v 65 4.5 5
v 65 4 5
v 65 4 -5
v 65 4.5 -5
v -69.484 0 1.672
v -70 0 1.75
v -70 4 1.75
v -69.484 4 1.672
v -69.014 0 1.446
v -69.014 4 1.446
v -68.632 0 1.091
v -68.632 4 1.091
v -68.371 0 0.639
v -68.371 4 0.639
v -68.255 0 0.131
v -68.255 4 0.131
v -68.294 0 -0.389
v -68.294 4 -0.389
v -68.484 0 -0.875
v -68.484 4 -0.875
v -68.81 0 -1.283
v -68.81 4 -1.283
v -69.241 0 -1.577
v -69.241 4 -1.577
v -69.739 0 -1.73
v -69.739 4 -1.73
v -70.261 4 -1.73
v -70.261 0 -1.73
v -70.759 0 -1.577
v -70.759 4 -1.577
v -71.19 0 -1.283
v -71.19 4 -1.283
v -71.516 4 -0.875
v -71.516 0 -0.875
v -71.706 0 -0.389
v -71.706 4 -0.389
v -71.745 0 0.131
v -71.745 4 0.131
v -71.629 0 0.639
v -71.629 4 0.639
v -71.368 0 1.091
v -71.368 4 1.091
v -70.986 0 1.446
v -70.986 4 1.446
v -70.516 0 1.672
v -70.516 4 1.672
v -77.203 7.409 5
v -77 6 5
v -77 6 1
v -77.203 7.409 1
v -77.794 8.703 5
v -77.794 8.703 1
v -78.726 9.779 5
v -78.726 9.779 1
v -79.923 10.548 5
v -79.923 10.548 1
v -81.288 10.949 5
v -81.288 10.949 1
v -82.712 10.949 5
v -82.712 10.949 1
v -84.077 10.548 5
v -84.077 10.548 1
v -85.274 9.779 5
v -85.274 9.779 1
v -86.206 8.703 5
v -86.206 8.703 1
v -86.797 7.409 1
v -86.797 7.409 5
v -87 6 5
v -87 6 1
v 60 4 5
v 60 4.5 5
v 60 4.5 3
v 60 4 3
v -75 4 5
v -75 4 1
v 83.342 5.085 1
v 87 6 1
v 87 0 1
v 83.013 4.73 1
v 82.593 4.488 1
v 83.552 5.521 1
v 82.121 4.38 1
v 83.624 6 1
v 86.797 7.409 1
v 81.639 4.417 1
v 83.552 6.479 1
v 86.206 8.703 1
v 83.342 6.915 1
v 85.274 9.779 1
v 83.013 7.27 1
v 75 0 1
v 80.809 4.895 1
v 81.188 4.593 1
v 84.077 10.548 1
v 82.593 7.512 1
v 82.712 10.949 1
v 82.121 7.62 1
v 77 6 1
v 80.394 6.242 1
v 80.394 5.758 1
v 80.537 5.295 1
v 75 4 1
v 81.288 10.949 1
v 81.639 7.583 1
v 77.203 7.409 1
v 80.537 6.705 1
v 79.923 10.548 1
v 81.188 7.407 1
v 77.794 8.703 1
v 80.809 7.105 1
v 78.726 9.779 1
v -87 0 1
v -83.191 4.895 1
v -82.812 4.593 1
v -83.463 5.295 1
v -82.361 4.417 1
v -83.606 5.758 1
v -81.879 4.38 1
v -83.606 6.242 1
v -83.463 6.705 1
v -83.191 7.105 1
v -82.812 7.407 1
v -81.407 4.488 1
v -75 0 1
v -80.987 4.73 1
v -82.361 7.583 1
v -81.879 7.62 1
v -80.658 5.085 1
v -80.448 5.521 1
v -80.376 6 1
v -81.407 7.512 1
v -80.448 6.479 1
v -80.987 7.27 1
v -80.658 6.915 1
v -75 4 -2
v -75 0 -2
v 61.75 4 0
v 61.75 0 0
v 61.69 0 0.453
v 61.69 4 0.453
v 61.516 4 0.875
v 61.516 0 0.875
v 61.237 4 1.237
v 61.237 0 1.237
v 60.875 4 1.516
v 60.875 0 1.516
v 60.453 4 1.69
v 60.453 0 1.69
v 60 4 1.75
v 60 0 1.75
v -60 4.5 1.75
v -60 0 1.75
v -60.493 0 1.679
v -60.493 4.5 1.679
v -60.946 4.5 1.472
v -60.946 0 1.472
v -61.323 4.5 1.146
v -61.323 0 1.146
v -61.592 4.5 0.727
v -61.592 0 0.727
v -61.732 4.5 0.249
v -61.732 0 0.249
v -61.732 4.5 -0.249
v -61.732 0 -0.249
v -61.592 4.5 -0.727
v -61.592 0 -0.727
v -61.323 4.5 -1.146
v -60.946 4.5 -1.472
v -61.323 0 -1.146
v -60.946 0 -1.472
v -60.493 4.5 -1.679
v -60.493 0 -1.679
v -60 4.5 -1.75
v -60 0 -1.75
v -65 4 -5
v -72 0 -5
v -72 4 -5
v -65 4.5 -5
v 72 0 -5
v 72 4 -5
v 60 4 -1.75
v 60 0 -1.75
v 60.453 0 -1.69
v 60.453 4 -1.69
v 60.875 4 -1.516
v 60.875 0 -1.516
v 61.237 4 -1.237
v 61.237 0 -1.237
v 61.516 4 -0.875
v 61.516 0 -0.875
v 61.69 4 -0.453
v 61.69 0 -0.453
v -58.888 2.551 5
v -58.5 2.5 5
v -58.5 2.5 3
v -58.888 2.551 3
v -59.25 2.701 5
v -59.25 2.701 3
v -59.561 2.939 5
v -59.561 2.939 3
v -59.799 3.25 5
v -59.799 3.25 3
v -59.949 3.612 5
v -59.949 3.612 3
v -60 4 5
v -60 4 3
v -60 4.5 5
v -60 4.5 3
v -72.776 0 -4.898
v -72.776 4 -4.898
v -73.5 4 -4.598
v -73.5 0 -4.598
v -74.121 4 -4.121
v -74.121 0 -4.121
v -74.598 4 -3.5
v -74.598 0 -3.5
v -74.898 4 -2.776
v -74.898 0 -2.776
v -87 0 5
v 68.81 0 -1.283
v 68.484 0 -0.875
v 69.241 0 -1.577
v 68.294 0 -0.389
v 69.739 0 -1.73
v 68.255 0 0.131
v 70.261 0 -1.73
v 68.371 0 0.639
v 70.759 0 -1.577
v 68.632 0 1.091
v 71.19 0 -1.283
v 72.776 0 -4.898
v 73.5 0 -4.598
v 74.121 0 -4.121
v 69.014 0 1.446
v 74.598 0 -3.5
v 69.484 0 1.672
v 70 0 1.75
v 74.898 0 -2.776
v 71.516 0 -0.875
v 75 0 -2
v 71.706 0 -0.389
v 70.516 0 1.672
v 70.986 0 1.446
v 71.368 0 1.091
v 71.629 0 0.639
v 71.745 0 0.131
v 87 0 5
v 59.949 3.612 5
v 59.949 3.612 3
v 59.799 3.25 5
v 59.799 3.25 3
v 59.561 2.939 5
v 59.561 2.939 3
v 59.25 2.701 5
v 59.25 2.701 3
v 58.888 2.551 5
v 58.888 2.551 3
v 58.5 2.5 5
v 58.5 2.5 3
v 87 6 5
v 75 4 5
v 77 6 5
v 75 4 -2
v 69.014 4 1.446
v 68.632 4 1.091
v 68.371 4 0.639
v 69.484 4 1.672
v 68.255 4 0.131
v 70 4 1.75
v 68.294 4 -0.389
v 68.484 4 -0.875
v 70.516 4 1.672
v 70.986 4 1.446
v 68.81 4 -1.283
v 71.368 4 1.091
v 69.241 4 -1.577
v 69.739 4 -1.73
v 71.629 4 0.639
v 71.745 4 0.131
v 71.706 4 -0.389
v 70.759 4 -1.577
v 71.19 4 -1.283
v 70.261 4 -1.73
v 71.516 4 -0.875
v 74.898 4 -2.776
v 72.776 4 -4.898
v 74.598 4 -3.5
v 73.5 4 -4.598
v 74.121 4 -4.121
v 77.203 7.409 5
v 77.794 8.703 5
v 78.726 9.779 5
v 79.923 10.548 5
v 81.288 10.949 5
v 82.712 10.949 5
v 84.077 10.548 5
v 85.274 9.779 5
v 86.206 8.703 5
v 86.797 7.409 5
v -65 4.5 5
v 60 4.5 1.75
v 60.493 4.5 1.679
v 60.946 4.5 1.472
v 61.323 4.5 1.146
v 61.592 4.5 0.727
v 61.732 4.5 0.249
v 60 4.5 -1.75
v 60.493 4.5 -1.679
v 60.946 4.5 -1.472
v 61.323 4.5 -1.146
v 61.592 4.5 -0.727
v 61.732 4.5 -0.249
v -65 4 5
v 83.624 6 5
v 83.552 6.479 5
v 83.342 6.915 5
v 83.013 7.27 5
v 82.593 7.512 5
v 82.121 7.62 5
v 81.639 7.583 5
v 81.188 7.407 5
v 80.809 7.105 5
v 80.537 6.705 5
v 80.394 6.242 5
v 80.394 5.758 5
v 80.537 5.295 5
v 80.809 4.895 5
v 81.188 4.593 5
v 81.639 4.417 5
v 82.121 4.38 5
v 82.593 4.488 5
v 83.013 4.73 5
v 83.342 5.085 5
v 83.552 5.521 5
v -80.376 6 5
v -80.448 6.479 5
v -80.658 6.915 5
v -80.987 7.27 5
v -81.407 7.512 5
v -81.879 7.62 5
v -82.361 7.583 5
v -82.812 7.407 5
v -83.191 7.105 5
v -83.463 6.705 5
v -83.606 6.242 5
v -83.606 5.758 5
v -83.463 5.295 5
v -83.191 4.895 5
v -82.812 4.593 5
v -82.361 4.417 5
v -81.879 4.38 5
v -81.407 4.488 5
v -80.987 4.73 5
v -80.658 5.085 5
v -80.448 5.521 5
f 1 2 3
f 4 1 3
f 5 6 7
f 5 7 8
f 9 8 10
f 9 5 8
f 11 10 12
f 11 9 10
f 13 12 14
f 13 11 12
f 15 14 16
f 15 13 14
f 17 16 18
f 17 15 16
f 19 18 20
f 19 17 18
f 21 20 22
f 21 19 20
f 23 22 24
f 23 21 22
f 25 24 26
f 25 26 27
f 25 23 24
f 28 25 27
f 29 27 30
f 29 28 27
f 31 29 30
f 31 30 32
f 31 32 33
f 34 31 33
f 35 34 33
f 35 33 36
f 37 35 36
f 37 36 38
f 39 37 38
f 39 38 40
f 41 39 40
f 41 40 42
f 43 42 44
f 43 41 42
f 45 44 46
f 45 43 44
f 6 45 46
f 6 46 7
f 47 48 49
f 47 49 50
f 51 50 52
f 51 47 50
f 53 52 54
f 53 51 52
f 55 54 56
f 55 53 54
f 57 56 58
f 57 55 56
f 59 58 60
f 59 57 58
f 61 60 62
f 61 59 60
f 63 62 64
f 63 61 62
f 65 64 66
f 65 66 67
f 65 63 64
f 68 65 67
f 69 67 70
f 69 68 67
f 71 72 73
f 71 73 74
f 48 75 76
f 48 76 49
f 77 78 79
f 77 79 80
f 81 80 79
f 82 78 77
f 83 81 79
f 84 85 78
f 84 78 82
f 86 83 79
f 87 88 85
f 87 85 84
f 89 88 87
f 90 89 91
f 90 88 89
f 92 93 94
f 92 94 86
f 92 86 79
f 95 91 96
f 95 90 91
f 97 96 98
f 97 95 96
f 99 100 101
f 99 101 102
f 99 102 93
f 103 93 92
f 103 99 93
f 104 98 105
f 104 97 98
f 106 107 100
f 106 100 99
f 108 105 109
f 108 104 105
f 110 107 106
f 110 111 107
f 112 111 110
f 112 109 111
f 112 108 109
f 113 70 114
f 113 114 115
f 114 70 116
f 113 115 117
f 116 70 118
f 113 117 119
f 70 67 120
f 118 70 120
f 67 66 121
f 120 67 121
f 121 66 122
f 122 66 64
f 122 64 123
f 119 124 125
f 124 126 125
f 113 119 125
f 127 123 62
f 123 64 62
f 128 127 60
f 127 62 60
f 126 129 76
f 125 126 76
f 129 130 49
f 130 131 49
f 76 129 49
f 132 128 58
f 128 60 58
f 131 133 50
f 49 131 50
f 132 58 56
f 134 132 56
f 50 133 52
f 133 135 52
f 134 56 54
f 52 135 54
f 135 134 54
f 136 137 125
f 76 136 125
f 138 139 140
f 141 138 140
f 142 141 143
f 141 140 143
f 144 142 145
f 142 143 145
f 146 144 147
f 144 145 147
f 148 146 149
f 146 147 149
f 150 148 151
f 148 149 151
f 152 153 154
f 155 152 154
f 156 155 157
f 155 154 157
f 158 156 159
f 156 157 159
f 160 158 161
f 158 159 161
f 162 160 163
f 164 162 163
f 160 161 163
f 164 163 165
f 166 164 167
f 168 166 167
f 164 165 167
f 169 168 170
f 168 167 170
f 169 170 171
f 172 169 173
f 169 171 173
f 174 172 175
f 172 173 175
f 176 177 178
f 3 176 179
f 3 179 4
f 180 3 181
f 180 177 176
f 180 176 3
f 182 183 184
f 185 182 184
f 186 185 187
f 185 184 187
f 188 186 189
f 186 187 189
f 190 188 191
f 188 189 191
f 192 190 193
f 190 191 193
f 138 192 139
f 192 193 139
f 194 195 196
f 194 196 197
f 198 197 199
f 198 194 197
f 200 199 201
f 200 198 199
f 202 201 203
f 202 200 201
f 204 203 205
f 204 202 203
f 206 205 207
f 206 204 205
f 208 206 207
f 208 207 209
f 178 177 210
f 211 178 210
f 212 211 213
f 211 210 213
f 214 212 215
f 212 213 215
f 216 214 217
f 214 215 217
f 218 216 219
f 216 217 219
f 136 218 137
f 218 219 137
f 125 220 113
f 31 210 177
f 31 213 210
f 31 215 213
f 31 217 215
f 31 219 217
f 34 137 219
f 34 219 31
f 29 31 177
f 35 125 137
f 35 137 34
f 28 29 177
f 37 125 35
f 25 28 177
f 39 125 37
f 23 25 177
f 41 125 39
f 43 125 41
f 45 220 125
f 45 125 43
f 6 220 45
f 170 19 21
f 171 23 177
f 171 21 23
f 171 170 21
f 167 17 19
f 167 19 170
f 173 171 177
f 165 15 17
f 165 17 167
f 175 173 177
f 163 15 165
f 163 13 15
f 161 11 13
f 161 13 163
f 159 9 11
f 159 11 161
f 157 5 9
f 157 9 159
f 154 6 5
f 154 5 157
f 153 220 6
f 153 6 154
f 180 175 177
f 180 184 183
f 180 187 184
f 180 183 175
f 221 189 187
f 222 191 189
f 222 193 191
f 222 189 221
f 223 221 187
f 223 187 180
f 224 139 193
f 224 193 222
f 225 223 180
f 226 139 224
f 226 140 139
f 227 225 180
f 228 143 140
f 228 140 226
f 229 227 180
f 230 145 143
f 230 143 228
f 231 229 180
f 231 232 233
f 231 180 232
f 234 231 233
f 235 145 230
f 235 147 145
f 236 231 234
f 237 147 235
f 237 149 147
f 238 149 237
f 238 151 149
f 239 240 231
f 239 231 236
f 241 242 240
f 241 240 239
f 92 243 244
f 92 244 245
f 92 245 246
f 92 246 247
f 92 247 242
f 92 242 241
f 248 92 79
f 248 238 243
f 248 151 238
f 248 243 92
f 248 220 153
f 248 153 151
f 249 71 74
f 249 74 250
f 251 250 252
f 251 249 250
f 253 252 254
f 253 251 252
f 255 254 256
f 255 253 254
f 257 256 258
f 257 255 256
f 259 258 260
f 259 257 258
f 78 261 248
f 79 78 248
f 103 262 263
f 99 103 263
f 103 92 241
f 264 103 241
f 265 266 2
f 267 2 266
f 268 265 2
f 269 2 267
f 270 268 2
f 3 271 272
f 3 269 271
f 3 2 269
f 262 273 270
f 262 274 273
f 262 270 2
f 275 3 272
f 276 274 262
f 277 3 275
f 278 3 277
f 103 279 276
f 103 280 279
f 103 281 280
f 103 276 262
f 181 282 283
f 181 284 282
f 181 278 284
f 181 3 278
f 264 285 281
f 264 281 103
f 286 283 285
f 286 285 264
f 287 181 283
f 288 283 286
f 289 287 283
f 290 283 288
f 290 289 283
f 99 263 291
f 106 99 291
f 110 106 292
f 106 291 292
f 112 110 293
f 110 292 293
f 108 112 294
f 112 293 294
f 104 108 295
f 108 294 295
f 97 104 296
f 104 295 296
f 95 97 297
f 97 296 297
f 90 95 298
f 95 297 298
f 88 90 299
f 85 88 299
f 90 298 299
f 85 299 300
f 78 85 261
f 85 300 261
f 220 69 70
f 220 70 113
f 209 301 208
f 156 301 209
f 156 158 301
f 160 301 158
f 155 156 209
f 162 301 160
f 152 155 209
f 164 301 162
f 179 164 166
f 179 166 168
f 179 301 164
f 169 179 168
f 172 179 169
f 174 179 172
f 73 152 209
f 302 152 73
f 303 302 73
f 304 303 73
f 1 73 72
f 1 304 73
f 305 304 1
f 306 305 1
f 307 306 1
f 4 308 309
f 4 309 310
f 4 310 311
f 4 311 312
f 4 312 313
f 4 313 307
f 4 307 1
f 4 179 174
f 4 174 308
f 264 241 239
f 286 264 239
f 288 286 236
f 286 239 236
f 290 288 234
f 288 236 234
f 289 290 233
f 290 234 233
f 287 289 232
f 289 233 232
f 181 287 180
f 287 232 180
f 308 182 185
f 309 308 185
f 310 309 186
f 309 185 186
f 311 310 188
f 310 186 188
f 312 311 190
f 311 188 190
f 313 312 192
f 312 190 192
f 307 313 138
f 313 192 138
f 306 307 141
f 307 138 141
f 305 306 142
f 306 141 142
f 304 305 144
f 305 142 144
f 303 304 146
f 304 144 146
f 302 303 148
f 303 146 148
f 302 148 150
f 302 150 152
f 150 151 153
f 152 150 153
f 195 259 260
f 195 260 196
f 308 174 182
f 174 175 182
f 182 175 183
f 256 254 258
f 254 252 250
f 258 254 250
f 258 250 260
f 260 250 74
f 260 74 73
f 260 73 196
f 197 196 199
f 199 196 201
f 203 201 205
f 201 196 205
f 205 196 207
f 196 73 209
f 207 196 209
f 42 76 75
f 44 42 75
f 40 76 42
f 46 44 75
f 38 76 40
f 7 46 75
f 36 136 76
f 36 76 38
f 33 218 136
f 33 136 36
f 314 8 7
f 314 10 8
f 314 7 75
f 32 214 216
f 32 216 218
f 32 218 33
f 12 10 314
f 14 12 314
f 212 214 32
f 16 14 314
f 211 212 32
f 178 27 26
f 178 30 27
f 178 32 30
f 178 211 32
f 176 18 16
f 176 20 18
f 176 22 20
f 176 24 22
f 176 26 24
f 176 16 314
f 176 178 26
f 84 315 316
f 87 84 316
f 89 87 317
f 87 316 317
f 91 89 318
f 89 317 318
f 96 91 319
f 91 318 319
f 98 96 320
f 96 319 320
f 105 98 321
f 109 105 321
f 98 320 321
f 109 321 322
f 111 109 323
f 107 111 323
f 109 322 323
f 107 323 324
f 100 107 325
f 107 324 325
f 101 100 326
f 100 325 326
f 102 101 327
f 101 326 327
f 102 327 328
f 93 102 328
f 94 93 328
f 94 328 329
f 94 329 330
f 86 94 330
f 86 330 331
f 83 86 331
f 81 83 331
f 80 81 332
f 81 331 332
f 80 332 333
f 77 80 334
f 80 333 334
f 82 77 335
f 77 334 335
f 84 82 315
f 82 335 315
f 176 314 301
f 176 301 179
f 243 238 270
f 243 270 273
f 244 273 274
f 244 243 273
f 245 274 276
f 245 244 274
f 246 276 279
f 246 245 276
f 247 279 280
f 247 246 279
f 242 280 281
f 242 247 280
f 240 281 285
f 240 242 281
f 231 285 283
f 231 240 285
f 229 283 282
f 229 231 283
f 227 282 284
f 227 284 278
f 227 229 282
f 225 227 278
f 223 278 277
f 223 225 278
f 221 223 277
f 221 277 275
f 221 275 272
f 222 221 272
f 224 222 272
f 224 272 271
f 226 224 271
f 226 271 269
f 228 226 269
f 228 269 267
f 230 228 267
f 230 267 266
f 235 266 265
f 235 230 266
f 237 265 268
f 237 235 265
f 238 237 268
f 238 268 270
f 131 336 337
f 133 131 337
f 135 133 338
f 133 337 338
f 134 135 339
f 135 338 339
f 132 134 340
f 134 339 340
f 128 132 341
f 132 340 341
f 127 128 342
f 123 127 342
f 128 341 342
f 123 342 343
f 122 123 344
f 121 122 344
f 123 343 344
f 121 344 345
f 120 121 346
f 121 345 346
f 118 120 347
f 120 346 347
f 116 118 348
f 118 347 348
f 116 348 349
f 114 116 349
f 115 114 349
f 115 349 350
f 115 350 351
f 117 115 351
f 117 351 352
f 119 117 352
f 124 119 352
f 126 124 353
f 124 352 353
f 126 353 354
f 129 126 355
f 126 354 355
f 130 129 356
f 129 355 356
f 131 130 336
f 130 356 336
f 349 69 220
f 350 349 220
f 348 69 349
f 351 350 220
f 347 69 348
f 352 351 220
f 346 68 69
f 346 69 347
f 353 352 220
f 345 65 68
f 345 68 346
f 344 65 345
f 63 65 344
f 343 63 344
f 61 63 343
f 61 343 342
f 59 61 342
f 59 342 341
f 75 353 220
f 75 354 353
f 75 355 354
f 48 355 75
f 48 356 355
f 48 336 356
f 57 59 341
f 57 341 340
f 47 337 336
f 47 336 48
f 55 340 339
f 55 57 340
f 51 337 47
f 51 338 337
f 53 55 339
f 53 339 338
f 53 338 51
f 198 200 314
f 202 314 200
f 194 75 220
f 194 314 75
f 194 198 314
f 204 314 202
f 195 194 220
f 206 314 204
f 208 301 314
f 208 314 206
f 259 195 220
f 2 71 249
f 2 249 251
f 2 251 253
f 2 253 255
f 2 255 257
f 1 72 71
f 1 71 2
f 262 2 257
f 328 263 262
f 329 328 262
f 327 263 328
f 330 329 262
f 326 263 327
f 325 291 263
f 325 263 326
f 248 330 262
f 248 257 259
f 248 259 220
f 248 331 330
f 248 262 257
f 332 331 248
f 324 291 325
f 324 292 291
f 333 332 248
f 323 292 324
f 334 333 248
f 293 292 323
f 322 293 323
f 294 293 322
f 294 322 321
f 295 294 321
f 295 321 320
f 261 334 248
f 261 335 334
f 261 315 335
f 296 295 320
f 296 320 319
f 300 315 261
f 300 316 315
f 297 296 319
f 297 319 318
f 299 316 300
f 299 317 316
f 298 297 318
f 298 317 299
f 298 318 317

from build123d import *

# Parameters (mm, degrees)
SKETCH1_R           = 1.75
BOSS_EXTRUDE1_DEPTH = 4
SKETCH2_W           = 130
SKETCH2_H           = 10
BOSS_EXTRUDE2_DEPTH = 0.5
CUT_EXTRUDE1_DEPTH  = 2
SKETCH4_R           = 1.624205192
BOSS_EXTRUDE3_DEPTH = 4


with BuildPart() as part:
    # Sketch1 → Boss-Extrude1 (new body)
    with BuildSketch(Plane(origin=(0, 0, 0), x_dir=(1, 0, 0), z_dir=(0, 1, 0))):
        with BuildLine():
            ThreePointArc((75, 2), (74.121320344, 4.121320344), (72, 5))
            Line((72, 5), (-72, 5))
            ThreePointArc((-72, 5), (-74.121320344, 4.121320344), (-75, 2))
            Line((-75, 2), (-75, -5))
            Line((-75, -5), (75, -5))
            Line((75, -5), (75, 2))
        make_face()
        with Locations(Location((-70, 0, 0), (0, 0, 270))):
            Circle(SKETCH1_R, mode=Mode.SUBTRACT)
        with BuildLine():
            ThreePointArc((61.75, 0), (61.237436867, -1.237436867), (60, -1.75))
            Line((60, -1.75), (-60, -1.75))
            ThreePointArc((-60, -1.75), (-61.75, 0), (-60, 1.75))
            Line((-60, 1.75), (60, 1.75))
            ThreePointArc((60, 1.75), (61.237436867, 1.237436867), (61.75, 0))
        make_face(mode=Mode.SUBTRACT)
        with Locations(Location((70, 0, 0), (0, 0, 270))):
            Circle(SKETCH1_R, mode=Mode.SUBTRACT)
    extrude(amount=BOSS_EXTRUDE1_DEPTH)

    # Sketch2 → Boss-Extrude2 (add)
    with BuildSketch(Plane(origin=(0, 4, 0), x_dir=(1, 0, 0), z_dir=(0, 1, 0))):
        Rectangle(SKETCH2_W, SKETCH2_H)
        with BuildLine():
            Line((-60, 1.75), (60, 1.75))
            ThreePointArc((60, 1.75), (61.75, 0), (60, -1.75))
            Line((60, -1.75), (-60, -1.75))
            ThreePointArc((-60, -1.75), (-61.75, 0), (-60, 1.75))
        make_face(mode=Mode.SUBTRACT)
    extrude(amount=BOSS_EXTRUDE2_DEPTH)

    # Sketch3 → Cut-Extrude1 (cut)
    with BuildSketch(Plane.XY.offset(5)):
        with BuildLine():
            Line((58.5, 2.5), (-58.5, 2.5))
            ThreePointArc((-58.5, 2.5), (-59.560660172, 2.939339828), (-60, 4))
            Line((-60, 4), (-60, 4.5))
            Line((-60, 4.5), (60, 4.5))
            Line((60, 4.5), (60, 4))
            ThreePointArc((60, 4), (59.560660172, 2.939339828), (58.5, 2.5))
        make_face()
    extrude(amount=-CUT_EXTRUDE1_DEPTH, mode=Mode.SUBTRACT)

    # Sketch4 → Boss-Extrude3 (add)
    # profile 1 of 2: a face of its own
    with BuildSketch(Plane.XY.offset(5)):
        with BuildLine():
            Line((-75, 4), (-77, 6))
            ThreePointArc((-77, 6), (-82, 11), (-87, 6))
            Line((-87, 6), (-87, 0))
            Line((-87, 0), (-75, 0))
            Line((-75, 0), (-75, 4))
        make_face()
        with Locations((-82, 6)):
            Circle(SKETCH4_R, mode=Mode.SUBTRACT)
    # profile 2 of 2: a face of its own
    with BuildSketch(Plane.XY.offset(5)):
        with BuildLine():
            ThreePointArc((77, 6), (82, 11), (87, 6))
            Line((87, 6), (87, 0))
            Line((87, 0), (75, 0))
            Line((75, 0), (75, 4))
            Line((75, 4), (77, 6))
        make_face()
        with Locations((82, 6)):
            Circle(SKETCH4_R, mode=Mode.SUBTRACT)
    extrude(amount=-BOSS_EXTRUDE3_DEPTH)


solid = part.part
